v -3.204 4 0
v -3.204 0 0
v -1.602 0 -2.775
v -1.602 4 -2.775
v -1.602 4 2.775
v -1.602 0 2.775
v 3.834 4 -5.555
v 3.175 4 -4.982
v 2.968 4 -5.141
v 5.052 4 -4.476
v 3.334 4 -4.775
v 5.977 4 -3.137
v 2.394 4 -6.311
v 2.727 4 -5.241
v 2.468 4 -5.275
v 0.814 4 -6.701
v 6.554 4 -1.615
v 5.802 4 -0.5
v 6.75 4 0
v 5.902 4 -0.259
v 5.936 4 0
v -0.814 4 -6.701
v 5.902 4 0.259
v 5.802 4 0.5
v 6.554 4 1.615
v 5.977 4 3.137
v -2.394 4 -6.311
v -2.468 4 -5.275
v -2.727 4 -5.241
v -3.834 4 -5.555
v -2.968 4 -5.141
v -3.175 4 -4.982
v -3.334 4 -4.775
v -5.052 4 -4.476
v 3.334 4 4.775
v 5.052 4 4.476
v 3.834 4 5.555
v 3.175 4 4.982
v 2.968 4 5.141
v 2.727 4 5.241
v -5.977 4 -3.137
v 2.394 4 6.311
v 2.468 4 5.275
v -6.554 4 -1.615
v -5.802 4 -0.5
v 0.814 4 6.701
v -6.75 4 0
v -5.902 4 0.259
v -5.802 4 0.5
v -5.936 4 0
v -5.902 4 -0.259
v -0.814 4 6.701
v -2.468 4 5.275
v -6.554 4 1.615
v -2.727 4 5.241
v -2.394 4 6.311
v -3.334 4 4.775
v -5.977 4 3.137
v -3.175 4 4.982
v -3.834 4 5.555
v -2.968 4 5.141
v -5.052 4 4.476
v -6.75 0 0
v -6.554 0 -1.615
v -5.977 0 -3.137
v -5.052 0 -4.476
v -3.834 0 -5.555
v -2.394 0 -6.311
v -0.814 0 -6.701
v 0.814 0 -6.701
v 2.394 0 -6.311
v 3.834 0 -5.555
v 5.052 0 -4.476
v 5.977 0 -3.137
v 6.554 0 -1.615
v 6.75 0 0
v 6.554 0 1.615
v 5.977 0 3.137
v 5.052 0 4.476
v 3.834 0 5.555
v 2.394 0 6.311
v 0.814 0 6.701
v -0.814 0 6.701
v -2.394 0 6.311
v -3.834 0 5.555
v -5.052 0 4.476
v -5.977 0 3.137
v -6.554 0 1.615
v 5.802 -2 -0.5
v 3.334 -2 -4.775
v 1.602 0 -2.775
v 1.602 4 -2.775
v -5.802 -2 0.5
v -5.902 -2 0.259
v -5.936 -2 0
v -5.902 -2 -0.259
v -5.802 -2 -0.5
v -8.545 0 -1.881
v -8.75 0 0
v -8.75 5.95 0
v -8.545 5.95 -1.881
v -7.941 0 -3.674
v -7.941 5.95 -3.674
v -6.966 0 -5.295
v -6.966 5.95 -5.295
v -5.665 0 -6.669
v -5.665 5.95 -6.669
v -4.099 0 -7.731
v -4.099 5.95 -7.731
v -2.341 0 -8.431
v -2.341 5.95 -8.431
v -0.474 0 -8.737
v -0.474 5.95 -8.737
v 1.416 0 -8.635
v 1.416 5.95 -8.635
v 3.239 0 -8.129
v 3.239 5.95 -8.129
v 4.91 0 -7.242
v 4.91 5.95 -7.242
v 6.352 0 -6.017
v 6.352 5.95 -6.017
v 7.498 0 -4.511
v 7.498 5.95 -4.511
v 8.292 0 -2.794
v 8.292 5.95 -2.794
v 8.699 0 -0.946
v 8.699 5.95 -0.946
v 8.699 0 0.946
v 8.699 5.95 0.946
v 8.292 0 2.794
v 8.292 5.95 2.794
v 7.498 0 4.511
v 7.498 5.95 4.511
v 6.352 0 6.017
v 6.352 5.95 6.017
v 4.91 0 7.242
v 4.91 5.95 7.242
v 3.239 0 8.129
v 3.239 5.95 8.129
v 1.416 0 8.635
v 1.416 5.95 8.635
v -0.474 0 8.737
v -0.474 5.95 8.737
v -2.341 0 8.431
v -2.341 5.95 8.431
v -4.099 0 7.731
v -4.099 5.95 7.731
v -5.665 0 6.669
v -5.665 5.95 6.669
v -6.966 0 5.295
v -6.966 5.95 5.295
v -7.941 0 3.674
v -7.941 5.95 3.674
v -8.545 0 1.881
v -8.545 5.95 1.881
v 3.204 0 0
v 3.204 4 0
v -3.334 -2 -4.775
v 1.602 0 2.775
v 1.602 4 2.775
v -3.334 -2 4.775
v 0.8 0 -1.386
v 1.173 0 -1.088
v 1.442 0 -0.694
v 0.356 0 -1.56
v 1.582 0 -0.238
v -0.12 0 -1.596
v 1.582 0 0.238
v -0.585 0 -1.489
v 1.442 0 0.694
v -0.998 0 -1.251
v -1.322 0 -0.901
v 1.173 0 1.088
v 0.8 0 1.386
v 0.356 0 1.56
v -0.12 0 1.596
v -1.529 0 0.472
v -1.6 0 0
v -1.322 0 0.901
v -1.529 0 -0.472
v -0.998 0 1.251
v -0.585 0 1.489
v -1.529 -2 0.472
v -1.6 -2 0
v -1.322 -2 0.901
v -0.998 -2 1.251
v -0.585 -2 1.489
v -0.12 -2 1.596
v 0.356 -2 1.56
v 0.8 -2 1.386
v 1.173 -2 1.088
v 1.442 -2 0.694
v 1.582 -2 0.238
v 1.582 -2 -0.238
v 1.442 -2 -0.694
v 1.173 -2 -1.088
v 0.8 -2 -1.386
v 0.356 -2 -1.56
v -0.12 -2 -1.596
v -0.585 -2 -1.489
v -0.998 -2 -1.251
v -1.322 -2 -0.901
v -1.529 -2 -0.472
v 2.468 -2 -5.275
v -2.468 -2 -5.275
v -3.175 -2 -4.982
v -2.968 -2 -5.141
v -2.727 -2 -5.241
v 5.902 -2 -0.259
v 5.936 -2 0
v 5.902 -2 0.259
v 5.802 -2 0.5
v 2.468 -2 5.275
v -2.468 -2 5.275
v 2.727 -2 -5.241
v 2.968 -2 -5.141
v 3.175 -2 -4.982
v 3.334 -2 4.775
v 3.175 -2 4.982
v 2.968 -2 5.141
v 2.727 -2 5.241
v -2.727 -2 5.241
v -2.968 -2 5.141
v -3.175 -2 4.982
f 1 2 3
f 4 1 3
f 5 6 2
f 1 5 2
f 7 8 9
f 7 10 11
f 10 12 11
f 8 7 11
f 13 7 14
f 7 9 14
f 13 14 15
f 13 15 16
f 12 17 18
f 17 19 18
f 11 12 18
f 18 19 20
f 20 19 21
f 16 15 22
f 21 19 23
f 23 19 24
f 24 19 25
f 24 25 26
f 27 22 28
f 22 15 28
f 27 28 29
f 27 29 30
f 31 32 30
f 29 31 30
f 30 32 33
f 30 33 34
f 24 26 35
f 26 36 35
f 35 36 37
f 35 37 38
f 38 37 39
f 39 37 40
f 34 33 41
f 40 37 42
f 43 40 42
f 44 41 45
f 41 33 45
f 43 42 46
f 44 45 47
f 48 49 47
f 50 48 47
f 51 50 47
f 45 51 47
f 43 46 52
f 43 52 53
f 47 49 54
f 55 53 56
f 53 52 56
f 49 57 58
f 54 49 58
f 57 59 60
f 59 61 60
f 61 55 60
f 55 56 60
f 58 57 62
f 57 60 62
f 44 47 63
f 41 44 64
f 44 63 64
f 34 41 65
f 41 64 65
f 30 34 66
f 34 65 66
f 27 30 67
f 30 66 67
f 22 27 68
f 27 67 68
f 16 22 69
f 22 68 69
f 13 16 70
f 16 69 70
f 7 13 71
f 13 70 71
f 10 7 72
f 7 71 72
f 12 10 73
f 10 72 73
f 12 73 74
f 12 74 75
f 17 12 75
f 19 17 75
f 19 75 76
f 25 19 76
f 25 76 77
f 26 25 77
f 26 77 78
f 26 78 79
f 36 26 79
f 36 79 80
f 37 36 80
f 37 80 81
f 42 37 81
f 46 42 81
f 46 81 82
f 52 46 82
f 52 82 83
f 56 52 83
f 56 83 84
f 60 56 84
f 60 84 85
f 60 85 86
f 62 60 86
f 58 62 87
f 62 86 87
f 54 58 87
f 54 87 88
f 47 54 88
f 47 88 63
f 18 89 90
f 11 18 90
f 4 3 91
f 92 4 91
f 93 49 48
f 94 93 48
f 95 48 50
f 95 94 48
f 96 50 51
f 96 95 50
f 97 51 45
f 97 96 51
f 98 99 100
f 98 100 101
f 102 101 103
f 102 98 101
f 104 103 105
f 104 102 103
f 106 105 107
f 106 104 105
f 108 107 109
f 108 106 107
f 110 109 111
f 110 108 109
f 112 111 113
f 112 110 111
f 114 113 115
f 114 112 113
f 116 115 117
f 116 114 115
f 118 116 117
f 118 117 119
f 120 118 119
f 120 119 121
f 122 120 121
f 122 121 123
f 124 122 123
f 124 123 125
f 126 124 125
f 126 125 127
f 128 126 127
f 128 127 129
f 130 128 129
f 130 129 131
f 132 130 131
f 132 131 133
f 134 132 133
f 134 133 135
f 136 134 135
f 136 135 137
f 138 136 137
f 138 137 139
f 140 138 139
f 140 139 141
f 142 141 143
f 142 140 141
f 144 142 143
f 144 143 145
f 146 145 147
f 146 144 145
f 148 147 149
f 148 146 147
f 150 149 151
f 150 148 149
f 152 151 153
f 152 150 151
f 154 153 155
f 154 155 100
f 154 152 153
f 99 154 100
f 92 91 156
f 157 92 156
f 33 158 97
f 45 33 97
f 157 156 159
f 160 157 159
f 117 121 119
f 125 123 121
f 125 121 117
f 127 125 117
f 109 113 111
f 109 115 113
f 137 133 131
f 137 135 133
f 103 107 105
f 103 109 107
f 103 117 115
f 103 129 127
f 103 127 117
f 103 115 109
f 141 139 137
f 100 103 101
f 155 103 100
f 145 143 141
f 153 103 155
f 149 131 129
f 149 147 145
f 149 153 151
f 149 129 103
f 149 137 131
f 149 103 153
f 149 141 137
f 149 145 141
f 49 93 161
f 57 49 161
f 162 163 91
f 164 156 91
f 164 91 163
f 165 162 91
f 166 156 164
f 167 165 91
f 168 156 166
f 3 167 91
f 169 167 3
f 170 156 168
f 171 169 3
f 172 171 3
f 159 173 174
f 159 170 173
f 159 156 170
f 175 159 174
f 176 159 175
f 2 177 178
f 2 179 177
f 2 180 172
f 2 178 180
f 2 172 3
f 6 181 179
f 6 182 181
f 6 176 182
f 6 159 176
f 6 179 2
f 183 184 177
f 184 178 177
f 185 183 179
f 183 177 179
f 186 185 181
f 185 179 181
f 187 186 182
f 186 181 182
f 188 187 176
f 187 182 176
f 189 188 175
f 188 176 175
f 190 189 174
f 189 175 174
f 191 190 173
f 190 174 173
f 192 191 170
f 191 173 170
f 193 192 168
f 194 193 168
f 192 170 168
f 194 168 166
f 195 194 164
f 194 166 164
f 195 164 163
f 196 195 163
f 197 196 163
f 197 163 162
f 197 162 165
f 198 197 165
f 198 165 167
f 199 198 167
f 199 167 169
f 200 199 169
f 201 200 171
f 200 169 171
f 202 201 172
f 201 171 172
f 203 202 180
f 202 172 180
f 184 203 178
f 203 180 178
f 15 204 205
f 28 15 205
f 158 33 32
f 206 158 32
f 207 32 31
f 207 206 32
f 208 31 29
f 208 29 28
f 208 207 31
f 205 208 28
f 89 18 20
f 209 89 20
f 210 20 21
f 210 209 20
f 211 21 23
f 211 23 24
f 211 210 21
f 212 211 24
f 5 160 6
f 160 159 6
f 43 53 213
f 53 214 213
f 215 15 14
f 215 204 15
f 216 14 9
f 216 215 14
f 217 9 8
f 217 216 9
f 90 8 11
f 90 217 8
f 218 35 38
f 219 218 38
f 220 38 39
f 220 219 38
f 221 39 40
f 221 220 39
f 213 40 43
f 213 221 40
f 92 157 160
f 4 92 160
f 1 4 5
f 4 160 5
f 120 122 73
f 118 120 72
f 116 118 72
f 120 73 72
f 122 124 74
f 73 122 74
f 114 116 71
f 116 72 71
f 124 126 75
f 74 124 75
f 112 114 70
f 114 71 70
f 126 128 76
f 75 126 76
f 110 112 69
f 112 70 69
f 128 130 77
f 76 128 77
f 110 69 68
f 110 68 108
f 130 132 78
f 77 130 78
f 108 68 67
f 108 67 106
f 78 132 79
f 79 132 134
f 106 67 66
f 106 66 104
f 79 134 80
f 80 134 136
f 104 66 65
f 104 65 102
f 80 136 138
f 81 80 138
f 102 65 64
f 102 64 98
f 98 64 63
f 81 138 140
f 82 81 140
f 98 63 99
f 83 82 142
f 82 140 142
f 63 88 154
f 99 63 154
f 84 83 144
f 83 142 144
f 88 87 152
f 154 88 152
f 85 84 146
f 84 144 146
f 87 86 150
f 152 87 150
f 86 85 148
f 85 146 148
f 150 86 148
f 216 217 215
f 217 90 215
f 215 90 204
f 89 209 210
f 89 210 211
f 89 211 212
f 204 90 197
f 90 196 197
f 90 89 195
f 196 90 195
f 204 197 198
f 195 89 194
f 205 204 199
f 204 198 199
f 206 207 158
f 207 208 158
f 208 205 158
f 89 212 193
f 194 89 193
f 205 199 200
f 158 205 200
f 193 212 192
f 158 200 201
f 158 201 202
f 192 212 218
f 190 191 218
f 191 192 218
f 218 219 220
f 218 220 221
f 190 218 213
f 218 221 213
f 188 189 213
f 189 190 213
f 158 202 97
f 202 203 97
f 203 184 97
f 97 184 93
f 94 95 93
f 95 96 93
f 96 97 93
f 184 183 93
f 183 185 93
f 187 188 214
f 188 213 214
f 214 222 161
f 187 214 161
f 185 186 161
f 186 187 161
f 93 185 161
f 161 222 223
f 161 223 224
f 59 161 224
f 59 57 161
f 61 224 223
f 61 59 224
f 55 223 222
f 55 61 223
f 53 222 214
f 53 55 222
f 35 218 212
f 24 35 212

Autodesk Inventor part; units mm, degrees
ref_plane "YZ Plane" through (0, 0, 0) normal (1, 0, 0) x (0, 1, 0)
ref_plane "XZ Plane" through (0, 0, 0) normal (0, 1, 0) x (-1, 0, 0)
ref_plane "XY Plane" through (0, 0, 0) normal (0, 0, 1) x (1, 0, 0)
sketch "Sketch1" plane through (0, 0, 0) normal (0, 1, 0) x (-1, 0, 0)
  line L0 (-8.75, 22.75) -> (8.75, 22.75)
  line L1 (8.75, 22.75) -> (8.75, -22.75)
  line L2 (8.75, -22.75) -> (-8.75, -22.75)
  line L3 (-8.75, -22.75) -> (-8.75, 22.75)
  line L4 (-8.75, 22.75) -> (8.75, -22.75) construction
  line L5 (8.75, 22.75) -> (-8.75, -22.75) construction
  line L6 (-1.6021, -2.775) -> (-3.2043, 0)
  line L7 (-3.2043, 0) -> (-1.6021, 2.775)
  line L8 (-1.6021, 2.775) -> (1.6021, 2.775)
  line L9 (1.6021, 2.775) -> (3.2043, 0)
  line L10 (3.2043, 0) -> (1.6021, -2.775)
  line L11 (1.6021, -2.775) -> (-1.6021, -2.775)
  line L12 (6.091, 0) -> (3.0455, 5.275)
  line L13 (3.0455, 5.275) -> (-3.0455, 5.275)
  line L14 (-3.0455, 5.275) -> (-6.091, 0)
  line L15 (-6.091, 0) -> (-3.0455, -5.275)
  line L16 (-3.0455, -5.275) -> (3.0455, -5.275)
  line L17 (3.0455, -5.275) -> (6.091, 0)
  line L18 (6.75, -20.75) -> (6.75, 20.75)
  line L19 (6.75, 20.75) -> (-6.75, 20.75)
  line L20 (-6.75, 20.75) -> (-6.75, -20.75)
  line L21 (-6.75, -20.75) -> (6.75, -20.75)
  circle A0 centre (0, 0) radius 1.6
  circle A1 centre (0, 0) radius 8.75
  circle A2 centre (0, 0) radius 6.75
  dimension "d0" = 17.5
  dimension "d1" = 45.5
  dimension "d2" = 5.55
  dimension "d8" = 2.5
  dimension "d9" = 2
  dimension "d11" = 3.2
  dimension "d14" = 17.5
  dimension "d15" = 2
extrude "Extrusion1" add sketch "Sketch1" along normal blind 5.95 contours A1 L20 | A1 L18 | A1 L18 A2 L20 | L20 A2 L18 A1 | A2 | L6 L7 L8 L9 L10 L11 | L17 L16 L15 L14 L13 L12 | A0
extrude "Extrusion5" add sketch "Sketch1" against normal blind 2 contours L6 L7 L8 L9 L10 L11 | L17 L16 L15 L14 L13 L12
extrude "Extrusion2" cut sketch "Sketch1" along normal blind 4 contours A2 | L6 L7 L8 L9 L10 L11 | A0
fillet "Fillet1" radius 1 6 edges at (6.091, 1, 0) (-3.0455, 1, 5.275) (3.0455, 1, -5.275) (-3.0455, 1, -5.275) (-6.091, 1, 0) (3.0455, 1, 5.275)
fillet "Fillet2" [suppressed]
equation "\"d14\" = d0"
properties part number "Solenoid Shield"
